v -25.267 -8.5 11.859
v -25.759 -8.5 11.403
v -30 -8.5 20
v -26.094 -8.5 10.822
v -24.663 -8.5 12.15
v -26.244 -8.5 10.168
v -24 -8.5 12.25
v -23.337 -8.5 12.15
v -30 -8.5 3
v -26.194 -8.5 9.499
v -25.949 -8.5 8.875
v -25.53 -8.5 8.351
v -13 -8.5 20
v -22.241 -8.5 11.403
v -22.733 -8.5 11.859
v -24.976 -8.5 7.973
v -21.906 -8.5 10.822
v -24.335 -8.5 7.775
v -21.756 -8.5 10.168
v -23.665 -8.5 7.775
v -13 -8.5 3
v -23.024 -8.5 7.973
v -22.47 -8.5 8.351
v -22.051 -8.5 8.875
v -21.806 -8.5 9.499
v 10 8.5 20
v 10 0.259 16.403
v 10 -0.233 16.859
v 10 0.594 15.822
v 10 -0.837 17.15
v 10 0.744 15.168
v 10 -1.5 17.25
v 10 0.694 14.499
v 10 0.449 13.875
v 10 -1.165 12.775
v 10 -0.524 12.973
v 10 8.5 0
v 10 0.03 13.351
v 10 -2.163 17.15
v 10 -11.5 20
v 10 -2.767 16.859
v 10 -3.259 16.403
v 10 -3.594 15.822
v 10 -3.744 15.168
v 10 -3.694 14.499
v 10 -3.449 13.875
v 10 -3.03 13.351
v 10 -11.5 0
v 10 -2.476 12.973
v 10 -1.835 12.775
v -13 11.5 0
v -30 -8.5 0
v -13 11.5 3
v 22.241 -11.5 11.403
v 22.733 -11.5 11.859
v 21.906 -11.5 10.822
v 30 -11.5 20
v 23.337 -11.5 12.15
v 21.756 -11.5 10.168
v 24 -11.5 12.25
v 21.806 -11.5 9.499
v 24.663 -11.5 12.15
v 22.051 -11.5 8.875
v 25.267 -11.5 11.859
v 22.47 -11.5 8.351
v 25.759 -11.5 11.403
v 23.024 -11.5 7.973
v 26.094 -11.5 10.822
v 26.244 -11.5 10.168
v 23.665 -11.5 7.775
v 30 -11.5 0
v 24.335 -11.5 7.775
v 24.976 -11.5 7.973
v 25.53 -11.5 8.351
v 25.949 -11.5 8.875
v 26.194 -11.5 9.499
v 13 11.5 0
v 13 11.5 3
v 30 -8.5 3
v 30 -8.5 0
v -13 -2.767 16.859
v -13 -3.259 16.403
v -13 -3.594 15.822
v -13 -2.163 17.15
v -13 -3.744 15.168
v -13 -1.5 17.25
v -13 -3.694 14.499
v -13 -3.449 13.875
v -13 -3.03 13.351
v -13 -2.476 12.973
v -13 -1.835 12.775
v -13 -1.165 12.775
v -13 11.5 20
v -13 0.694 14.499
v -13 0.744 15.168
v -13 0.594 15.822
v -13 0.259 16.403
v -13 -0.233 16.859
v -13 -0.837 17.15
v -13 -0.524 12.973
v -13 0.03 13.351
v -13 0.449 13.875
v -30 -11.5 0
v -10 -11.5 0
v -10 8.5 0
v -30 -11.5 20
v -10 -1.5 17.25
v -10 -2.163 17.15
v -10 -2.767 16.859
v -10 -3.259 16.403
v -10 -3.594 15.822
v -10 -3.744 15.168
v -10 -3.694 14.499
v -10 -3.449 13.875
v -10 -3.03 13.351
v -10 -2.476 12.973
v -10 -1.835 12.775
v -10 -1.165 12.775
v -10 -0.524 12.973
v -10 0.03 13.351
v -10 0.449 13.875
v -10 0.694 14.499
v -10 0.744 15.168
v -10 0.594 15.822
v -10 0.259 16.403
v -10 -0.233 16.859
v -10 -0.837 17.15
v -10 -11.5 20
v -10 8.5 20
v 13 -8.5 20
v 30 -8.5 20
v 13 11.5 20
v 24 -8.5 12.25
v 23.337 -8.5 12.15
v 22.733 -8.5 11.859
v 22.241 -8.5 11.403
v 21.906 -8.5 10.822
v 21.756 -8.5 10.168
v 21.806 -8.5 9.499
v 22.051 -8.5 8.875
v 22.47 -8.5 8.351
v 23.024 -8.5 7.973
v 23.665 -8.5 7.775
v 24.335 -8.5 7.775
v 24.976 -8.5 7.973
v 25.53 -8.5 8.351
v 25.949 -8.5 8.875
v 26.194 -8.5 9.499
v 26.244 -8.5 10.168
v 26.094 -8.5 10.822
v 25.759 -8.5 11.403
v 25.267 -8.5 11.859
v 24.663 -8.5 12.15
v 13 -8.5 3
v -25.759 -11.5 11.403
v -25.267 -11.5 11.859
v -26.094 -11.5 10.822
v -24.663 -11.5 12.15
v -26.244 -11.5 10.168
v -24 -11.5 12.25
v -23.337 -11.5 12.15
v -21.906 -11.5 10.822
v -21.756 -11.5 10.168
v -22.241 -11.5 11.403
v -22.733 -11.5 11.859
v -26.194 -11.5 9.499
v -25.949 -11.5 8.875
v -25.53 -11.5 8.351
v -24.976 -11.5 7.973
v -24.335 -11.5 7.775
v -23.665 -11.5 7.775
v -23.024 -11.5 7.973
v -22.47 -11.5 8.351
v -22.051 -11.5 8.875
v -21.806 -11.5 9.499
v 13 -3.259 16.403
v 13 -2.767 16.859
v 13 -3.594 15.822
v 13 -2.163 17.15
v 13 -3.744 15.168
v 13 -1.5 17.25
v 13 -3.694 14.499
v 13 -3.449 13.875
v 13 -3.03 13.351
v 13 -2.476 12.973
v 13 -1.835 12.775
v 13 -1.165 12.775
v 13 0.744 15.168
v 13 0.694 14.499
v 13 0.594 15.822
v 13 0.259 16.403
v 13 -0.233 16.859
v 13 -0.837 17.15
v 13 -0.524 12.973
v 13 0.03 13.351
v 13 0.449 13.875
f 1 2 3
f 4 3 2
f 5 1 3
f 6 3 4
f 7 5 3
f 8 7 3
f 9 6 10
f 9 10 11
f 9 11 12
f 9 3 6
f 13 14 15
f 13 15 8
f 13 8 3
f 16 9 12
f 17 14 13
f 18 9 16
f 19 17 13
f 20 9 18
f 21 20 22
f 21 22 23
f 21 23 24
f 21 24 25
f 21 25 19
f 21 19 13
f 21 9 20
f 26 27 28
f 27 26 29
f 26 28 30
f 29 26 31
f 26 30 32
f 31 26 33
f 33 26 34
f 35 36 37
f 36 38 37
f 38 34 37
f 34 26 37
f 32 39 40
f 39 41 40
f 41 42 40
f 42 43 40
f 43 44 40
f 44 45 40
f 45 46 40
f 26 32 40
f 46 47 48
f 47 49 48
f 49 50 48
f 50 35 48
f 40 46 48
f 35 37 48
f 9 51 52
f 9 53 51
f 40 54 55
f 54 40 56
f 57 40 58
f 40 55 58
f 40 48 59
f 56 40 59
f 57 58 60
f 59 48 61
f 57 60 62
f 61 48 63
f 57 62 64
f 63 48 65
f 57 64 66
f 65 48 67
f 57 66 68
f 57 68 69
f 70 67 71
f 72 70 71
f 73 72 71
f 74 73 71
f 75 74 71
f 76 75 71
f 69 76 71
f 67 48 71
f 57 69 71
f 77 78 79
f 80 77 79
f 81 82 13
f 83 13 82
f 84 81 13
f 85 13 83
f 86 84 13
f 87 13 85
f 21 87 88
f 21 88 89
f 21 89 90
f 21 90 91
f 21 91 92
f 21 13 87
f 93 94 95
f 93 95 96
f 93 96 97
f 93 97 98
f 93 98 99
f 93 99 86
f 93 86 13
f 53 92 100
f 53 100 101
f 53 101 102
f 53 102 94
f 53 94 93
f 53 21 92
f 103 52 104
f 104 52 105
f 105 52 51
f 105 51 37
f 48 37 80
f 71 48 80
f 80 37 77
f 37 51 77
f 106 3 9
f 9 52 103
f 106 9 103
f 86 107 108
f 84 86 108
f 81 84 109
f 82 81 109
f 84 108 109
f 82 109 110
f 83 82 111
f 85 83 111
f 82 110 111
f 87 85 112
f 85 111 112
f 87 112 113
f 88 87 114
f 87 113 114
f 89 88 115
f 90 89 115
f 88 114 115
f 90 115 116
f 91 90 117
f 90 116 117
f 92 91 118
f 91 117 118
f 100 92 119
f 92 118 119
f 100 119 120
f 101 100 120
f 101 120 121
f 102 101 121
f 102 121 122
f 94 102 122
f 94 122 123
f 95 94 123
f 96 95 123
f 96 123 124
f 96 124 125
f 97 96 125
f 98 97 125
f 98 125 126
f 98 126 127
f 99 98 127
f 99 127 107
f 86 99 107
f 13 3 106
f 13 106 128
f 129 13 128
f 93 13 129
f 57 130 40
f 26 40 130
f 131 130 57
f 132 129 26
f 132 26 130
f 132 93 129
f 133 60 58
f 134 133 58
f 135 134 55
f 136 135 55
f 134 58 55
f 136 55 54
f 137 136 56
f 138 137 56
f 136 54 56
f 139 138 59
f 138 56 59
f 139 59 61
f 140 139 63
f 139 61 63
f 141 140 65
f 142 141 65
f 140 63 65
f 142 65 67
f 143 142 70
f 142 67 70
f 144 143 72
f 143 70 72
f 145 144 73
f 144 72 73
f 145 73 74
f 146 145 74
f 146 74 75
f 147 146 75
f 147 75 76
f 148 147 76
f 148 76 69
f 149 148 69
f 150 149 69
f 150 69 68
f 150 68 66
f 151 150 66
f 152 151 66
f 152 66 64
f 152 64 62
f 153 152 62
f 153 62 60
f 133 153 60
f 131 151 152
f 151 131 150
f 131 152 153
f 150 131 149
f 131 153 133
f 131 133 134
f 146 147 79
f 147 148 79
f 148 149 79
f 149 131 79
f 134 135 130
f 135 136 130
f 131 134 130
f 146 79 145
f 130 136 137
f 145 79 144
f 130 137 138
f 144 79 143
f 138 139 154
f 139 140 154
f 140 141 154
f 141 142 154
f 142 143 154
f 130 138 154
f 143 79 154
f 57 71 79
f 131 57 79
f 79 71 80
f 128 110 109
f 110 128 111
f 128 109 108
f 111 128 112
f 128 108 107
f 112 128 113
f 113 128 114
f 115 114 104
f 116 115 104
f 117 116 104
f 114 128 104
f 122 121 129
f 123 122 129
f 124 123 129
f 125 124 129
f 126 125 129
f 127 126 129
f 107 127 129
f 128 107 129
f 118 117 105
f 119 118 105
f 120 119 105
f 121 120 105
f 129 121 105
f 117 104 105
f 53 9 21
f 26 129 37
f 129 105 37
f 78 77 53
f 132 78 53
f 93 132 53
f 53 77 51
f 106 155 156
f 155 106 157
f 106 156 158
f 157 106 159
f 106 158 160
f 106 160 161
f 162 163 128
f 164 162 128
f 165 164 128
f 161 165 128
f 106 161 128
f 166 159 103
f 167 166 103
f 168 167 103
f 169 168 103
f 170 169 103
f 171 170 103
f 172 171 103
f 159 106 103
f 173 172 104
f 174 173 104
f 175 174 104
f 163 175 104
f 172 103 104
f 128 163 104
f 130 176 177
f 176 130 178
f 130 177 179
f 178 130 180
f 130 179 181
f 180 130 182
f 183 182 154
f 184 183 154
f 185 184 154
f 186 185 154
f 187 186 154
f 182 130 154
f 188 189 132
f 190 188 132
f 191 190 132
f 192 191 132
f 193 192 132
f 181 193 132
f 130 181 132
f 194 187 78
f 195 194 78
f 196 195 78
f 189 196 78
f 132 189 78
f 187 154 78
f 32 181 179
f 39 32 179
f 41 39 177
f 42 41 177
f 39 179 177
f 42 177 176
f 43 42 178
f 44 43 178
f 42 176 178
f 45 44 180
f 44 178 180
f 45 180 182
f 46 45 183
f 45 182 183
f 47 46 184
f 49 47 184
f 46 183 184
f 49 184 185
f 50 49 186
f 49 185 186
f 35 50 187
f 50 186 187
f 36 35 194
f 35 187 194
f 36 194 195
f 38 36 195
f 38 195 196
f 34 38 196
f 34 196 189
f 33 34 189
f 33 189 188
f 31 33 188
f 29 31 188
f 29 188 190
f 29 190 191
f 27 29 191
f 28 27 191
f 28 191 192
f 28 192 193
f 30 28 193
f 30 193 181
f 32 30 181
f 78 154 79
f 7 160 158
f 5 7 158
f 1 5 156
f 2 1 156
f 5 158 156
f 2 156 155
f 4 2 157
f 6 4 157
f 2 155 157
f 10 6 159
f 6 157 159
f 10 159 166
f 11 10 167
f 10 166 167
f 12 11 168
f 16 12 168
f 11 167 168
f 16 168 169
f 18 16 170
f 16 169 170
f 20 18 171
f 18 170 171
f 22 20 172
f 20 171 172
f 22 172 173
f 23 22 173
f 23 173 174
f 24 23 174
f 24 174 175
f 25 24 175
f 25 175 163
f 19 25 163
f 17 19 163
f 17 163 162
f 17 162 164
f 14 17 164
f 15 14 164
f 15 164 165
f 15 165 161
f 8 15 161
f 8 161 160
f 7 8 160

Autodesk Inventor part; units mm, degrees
ref_plane "YZ Plane" through (0, 0, 0) normal (1, 0, 0) x (0, 1, 0)
ref_plane "XZ Plane" through (0, 0, 0) normal (0, 1, 0) x (-1, 0, 0)
ref_plane "XY Plane" through (0, 0, 0) normal (0, 0, 1) x (1, 0, 0)
sketch "Sketch2" plane through (0, 0, 0) normal (0, 0, 1) x (1, 0, 0)
  line L0 (-30, 11.5) -> (-30, -11.5)
  line L1 (-30, -11.5) -> (-10, -11.5)
  line L2 (-10, -11.5) -> (-10, 8.5)
  line L3 (-10, 8.5) -> (10, 8.5)
  line L4 (10, 8.5) -> (10, -11.5)
  line L5 (10, -11.5) -> (30, -11.5)
  line L6 (30, -11.5) -> (30, 11.5)
  line L7 (30, 11.5) -> (-30, 11.5)
  point P0 (0, 0)
  point P1 (0, 11.5)
  point P2 (30, 0)
  dimension "d6" = 23
  dimension "d7" = 20
  dimension "d8" = 20
extrude "Extrusion1" add sketch "Sketch2" along normal blind 3
sketch "Sketch3" plane through (0, 0, 3) normal (0, 0, 1) x (1, 0, 0)
  line L0 (30, 11.5) -> (-30, 11.5) projected
  line L1 (-13, 11.5) -> (-30, -8.5)
  line L2 (-30, 11.5) -> (-30, -11.5) projected
  line L3 (-30, 11.5) -> (-13, 11.5)
  line L4 (-10, -11.5) -> (-10, 8.5) projected
  line L5 (13, 11.5) -> (30, -8.5)
  line L6 (30, -11.5) -> (30, 11.5) projected
  line L7 (10, 8.5) -> (10, -11.5) projected
  line L8 (10, -11.5) -> (30, -11.5) projected
  point P0 (0, 0)
  dimension "d11" = 3
  dimension "d12" = 3
  dimension "d13" = 3
  dimension "d14" = 3
extrude "Extrusion2" cut sketch "Sketch3" against normal through all
sketch "Sketch4" plane through (0, 0, 3) normal (0, 0, 1) x (1, 0, 0)
  line L0 (-30, -8.5) -> (-30, -11.5) projected
  line L1 (-30, -8.5) -> (-13, -8.5)
  line L2 (13, 11.5) -> (-13, 11.5) projected
  line L3 (-13, -8.5) -> (-13, 11.5)
  line L4 (30, -11.5) -> (30, -8.5) projected
  line L5 (30, -8.5) -> (13, -8.5)
  line L6 (13, -8.5) -> (13, 11.5)
  line L7 (30, -8.5) -> (13, 11.5) projected
  line L8 (13, 11.5) -> (-13, 11.5) projected
  line L9 (-13, 11.5) -> (-30, -8.5) projected
  line L10 (-30, -8.5) -> (-30, -11.5) projected
  line L11 (-30, -11.5) -> (-10, -11.5) projected
  line L12 (-10, -11.5) -> (-10, 8.5) projected
  line L13 (-10, 8.5) -> (10, 8.5) projected
  line L14 (10, 8.5) -> (10, -11.5) projected
  line L15 (10, -11.5) -> (30, -11.5) projected
  line L16 (30, -11.5) -> (30, -8.5) projected
  point P0 (0, 0)
  dimension "d17" = 90
  dimension "d20" = 90
extrude "Extrusion3" add sketch "Sketch4" along normal blind 17 contours L1 L3 L2 L6 L5 L4 L15 L14 L13 L12 L11 L0
sketch "Sketch5" plane through (-13, -8.5, 3) normal (-1, 0, 0) x (0, 0, 1)
  line L0 (-3, 17) -> (17, 17) projected
  line L1 (17, 20) -> (17, 0) projected
  point P0 (-3, 8.5)
  point P1 (12, 7)
  dimension "d23" = 10
  dimension "d24" = 5
hole "Hole1" at (-13, -1.5, 15) direction (1, 0, 0) diameter 4.5 end through all
sketch "Sketch6" plane through (-30, -8.5, 3) normal (0, 1, 0) x (1, 0, 0)
  line L0 (17, -17) -> (0, -17) projected
  line L1 (0, 0) -> (0, -17) projected
  line L2 (60, 0) -> (60, -17) projected
  point P0 (30, 3)
  point P1 (6, -7)
  point P2 (54, -7)
  dimension "d32" = 10
  dimension "d33" = 6
  dimension "d34" = 6
hole "Hole2" at (-24, -8.5, 10) at (24, -8.5, 10) direction (0, -1, 0) diameter 4.5 end through all
equation "\"d34\" = d33"
properties part number "Horizontal Support Bracket"
